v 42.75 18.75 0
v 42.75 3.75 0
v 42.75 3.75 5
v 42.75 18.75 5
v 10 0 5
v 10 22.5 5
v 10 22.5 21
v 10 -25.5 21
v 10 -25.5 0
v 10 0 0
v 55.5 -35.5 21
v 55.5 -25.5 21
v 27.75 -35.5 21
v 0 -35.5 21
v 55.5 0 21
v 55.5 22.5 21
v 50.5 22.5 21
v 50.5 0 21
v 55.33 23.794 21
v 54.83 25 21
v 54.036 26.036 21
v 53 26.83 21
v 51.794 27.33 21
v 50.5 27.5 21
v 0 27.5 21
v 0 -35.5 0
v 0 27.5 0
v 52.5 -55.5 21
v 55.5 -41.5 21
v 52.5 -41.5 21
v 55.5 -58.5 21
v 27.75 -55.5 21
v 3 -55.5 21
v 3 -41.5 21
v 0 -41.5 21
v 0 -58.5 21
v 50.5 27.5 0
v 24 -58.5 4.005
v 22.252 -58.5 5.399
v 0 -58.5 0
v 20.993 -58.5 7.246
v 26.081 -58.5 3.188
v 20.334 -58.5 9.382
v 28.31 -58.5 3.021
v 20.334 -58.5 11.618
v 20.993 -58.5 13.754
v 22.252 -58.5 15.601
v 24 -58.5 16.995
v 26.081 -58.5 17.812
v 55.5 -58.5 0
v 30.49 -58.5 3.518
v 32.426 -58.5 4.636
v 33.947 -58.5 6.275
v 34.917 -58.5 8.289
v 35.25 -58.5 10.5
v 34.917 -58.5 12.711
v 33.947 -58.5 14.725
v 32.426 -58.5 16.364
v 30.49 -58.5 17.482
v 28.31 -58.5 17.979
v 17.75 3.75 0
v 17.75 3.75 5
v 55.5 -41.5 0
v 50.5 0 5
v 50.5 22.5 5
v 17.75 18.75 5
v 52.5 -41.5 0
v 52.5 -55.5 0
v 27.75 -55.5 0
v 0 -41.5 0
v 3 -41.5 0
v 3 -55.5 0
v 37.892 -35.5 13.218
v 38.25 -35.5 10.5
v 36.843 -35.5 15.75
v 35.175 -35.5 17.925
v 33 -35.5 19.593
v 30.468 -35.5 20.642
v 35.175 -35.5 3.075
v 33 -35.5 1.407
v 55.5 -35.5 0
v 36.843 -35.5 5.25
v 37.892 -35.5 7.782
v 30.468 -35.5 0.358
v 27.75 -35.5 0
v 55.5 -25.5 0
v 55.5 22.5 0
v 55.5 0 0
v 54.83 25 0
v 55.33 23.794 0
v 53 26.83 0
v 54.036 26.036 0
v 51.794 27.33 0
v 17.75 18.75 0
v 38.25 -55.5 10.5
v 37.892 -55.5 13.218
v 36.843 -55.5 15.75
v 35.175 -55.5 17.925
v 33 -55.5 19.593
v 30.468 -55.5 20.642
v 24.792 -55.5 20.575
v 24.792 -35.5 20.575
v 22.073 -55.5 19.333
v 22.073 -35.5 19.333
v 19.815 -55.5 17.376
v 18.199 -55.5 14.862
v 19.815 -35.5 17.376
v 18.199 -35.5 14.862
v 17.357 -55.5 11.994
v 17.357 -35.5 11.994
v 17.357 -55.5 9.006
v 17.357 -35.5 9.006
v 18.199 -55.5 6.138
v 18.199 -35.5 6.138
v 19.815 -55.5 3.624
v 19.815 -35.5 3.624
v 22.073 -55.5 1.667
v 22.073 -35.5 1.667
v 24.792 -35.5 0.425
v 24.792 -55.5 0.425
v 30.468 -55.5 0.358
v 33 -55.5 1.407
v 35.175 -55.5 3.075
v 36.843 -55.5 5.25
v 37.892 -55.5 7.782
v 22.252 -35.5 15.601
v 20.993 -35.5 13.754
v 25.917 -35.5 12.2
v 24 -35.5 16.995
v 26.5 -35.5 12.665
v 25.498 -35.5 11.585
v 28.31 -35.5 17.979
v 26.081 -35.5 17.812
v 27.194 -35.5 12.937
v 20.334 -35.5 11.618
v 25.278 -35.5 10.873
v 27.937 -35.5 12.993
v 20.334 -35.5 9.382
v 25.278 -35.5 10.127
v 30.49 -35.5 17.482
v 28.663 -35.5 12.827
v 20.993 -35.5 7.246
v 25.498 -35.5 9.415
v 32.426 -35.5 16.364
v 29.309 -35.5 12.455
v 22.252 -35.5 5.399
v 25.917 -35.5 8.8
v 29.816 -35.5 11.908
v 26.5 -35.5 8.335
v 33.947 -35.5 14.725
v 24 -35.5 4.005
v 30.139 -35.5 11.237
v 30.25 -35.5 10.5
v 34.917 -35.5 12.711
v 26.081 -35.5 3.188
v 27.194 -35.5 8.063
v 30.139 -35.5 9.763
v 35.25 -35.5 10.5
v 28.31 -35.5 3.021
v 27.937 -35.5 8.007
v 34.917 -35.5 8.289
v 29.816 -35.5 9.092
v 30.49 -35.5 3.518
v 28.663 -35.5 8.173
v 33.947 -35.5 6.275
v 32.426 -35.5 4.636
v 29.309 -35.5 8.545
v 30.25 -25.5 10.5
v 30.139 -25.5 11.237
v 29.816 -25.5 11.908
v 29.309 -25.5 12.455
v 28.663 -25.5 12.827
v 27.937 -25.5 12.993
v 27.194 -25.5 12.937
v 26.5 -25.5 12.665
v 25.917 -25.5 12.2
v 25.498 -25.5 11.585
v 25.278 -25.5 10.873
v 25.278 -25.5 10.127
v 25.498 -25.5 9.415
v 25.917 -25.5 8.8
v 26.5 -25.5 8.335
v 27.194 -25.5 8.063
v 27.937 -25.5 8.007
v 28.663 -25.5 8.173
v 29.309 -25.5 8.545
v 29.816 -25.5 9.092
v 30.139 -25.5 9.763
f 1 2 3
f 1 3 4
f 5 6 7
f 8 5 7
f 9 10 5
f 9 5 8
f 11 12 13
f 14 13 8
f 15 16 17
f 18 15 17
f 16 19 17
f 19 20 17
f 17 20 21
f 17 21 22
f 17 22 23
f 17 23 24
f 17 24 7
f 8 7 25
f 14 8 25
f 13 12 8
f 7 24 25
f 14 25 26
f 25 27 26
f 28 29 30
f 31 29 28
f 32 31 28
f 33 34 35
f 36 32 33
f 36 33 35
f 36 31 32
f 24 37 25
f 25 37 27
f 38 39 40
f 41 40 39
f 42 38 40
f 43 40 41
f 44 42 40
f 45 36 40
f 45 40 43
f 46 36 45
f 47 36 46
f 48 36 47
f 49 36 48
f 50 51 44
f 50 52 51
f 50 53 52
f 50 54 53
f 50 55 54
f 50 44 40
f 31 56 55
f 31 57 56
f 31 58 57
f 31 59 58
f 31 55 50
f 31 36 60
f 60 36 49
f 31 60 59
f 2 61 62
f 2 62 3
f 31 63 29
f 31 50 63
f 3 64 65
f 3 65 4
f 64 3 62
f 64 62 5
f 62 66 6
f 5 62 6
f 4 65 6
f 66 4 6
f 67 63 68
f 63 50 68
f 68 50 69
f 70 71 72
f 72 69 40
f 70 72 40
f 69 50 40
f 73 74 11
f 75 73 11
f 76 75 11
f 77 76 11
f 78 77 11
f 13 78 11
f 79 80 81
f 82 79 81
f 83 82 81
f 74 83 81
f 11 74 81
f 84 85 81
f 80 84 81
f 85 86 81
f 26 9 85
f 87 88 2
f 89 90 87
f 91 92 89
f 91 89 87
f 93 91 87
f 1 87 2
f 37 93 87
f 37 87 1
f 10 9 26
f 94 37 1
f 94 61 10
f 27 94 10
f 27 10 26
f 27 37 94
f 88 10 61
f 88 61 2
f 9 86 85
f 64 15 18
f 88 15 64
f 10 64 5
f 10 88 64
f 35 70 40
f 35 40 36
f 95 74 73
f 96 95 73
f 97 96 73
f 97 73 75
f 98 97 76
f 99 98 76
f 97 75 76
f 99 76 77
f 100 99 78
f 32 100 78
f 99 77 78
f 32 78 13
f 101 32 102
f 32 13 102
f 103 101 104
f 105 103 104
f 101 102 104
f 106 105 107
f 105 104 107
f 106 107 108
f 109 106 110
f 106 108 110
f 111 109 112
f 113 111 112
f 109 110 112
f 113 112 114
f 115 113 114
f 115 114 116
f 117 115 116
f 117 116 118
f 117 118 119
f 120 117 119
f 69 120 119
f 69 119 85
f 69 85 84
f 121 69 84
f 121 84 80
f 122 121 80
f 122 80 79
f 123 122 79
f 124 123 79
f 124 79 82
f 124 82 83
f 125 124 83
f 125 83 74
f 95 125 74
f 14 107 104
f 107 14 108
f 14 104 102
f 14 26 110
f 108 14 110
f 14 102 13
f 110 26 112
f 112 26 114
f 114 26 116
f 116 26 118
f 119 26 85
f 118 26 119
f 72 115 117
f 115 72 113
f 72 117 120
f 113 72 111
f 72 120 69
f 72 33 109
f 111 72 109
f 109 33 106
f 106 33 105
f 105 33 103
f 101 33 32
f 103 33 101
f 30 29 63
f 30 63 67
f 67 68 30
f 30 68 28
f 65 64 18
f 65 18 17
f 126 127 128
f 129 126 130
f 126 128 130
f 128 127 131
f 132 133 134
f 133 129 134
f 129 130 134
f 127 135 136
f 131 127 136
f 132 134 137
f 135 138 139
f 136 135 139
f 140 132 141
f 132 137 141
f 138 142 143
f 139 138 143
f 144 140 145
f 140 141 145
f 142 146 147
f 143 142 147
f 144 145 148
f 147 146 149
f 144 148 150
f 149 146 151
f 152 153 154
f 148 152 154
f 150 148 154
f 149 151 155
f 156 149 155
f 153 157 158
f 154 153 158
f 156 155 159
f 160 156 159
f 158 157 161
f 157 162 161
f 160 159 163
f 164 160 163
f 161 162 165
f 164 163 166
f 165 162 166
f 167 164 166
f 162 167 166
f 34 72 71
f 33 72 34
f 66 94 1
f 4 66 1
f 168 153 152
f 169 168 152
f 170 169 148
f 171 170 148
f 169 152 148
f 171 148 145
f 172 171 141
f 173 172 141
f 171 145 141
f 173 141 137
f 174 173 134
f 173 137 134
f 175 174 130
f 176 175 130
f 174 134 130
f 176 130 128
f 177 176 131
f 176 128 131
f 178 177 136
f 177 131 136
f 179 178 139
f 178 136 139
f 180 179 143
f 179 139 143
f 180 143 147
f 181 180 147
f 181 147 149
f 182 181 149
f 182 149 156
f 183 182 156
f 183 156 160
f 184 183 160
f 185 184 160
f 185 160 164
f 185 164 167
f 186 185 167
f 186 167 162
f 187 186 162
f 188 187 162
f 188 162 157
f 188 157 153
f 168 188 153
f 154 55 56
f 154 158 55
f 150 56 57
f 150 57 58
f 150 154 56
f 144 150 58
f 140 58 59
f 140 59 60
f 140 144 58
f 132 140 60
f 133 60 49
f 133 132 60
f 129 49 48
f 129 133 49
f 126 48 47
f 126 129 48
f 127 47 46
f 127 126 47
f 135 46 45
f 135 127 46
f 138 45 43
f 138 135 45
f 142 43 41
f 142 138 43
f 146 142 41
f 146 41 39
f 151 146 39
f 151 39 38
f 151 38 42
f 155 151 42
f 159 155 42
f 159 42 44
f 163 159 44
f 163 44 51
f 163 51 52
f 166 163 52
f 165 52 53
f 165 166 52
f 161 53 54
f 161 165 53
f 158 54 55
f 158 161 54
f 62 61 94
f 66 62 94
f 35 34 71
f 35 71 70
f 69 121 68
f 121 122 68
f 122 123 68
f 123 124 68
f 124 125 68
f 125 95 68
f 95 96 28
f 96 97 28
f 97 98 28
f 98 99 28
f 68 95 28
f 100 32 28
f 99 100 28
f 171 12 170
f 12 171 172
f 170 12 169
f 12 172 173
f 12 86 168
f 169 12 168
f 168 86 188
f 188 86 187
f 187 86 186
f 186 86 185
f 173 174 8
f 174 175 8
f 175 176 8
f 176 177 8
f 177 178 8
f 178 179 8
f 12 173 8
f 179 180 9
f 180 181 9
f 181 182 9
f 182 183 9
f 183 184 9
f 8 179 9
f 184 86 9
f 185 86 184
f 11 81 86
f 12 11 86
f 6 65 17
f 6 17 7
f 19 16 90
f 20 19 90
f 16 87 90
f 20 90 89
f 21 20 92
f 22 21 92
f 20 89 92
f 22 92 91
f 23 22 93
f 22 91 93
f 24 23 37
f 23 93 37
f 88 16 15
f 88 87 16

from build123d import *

# Parameters (mm, degrees)
SKETCH_W      = 25
SKETCH_H      = 15
PAD_DEPTH     = 5
PAD001_DEPTH  = 16
SKETCH002_R   = 2.5
POCKET_DEPTH  = 15
SKETCH003_R   = 10.5
SKETCH003_R_2 = 7.5
PAD002_DEPTH  = 20
SKETCH004_W   = 55.5
SKETCH004_H   = 21
SKETCH004_R   = 7.5
PAD003_DEPTH  = 3
SKETCH005_W   = 3
SKETCH005_H   = 21
PAD004_DEPTH  = 14


with BuildPart() as part:
    # Sketch → Pad (new body)
    with BuildSketch(Plane.XY):
        with BuildLine():
            Line((0, -35.5), (0, 27.5))
            Line((0, 27.5), (50.5, 27.5))
            ThreePointArc((55.5, 22.5), (54.035534, 26.035534), (50.5, 27.5))
            Line((55.5, 22.5), (55.5, 0))
            Line((55.5, 0), (10, 0))
            Line((10, 0), (10, -25.5))
            Line((10, -25.5), (55.5, -25.5))
            Line((55.5, -25.5), (55.5, -35.5))
            Line((55.5, -35.5), (0, -35.5))
        make_face()
        with Locations((30.25, 11.25)):
            Rectangle(SKETCH_W, SKETCH_H, mode=Mode.SUBTRACT)
    extrude(amount=PAD_DEPTH)

    # Sketch001 (on Face15 of Pad) → Pad001 (join)
    with BuildSketch(Plane.XY.offset(5)):
        with BuildLine():
            Line((55.5, 22.5), (55.5, 0))
            Line((55.5, 0), (50.5, 0))
            Line((50.5, 0), (50.5, 22.5))
            Line((50.5, 22.5), (10, 22.5))
            Line((10, 22.5), (10, -25.5))
            Line((55.5, -25.5), (10, -25.5))
            Line((55.5, -35.5), (55.5, -25.5))
            Line((0, -35.5), (55.5, -35.5))
            Line((0, 27.5), (0, -35.5))
            Line((50.5, 27.5), (0, 27.5))
            ThreePointArc((55.5, 22.5), (54.035534, 26.035534), (50.5, 27.5))
        make_face()
    extrude(amount=PAD001_DEPTH)

    # Sketch002 (on Face26 of Pad001) → Pocket (cut)
    with BuildSketch(Plane.XZ.offset(35.5)):
        with Locations((27.75, 10.5)):
            Circle(SKETCH002_R)
    extrude(amount=-POCKET_DEPTH, mode=Mode.SUBTRACT)

    # Sketch003 (on Face26 of Pocket) → Pad002 (join)
    with BuildSketch(Plane.XZ.offset(35.5)):
        with Locations((27.75, 10.5)):
            Circle(SKETCH003_R)
        with Locations((27.75, 10.5)):
            Circle(SKETCH003_R_2, mode=Mode.SUBTRACT)
    extrude(amount=PAD002_DEPTH)

    # Sketch004 (on Face32 of Pad002) → Pad003 (join)
    with BuildSketch(Plane.XZ.offset(55.5)):
        with Locations((27.75, 10.5)):
            Rectangle(SKETCH004_W, SKETCH004_H)
        with Locations((27.75, 10.5)):
            Circle(SKETCH004_R, mode=Mode.SUBTRACT)
    extrude(amount=PAD003_DEPTH)

    # Sketch005 (on Face33 of Pad003) → Pad004 (join)
    with BuildSketch(Plane(origin=(0, -55.5, 0), x_dir=(-1, 0, 0), z_dir=(0, 1, 0))):
        with Locations((-54, 10.5)):
            Rectangle(SKETCH005_W, SKETCH005_H)
        with Locations((-1.5, 10.5)):
            Rectangle(SKETCH005_W, SKETCH005_H)
    extrude(amount=PAD004_DEPTH)


solid = part.part
